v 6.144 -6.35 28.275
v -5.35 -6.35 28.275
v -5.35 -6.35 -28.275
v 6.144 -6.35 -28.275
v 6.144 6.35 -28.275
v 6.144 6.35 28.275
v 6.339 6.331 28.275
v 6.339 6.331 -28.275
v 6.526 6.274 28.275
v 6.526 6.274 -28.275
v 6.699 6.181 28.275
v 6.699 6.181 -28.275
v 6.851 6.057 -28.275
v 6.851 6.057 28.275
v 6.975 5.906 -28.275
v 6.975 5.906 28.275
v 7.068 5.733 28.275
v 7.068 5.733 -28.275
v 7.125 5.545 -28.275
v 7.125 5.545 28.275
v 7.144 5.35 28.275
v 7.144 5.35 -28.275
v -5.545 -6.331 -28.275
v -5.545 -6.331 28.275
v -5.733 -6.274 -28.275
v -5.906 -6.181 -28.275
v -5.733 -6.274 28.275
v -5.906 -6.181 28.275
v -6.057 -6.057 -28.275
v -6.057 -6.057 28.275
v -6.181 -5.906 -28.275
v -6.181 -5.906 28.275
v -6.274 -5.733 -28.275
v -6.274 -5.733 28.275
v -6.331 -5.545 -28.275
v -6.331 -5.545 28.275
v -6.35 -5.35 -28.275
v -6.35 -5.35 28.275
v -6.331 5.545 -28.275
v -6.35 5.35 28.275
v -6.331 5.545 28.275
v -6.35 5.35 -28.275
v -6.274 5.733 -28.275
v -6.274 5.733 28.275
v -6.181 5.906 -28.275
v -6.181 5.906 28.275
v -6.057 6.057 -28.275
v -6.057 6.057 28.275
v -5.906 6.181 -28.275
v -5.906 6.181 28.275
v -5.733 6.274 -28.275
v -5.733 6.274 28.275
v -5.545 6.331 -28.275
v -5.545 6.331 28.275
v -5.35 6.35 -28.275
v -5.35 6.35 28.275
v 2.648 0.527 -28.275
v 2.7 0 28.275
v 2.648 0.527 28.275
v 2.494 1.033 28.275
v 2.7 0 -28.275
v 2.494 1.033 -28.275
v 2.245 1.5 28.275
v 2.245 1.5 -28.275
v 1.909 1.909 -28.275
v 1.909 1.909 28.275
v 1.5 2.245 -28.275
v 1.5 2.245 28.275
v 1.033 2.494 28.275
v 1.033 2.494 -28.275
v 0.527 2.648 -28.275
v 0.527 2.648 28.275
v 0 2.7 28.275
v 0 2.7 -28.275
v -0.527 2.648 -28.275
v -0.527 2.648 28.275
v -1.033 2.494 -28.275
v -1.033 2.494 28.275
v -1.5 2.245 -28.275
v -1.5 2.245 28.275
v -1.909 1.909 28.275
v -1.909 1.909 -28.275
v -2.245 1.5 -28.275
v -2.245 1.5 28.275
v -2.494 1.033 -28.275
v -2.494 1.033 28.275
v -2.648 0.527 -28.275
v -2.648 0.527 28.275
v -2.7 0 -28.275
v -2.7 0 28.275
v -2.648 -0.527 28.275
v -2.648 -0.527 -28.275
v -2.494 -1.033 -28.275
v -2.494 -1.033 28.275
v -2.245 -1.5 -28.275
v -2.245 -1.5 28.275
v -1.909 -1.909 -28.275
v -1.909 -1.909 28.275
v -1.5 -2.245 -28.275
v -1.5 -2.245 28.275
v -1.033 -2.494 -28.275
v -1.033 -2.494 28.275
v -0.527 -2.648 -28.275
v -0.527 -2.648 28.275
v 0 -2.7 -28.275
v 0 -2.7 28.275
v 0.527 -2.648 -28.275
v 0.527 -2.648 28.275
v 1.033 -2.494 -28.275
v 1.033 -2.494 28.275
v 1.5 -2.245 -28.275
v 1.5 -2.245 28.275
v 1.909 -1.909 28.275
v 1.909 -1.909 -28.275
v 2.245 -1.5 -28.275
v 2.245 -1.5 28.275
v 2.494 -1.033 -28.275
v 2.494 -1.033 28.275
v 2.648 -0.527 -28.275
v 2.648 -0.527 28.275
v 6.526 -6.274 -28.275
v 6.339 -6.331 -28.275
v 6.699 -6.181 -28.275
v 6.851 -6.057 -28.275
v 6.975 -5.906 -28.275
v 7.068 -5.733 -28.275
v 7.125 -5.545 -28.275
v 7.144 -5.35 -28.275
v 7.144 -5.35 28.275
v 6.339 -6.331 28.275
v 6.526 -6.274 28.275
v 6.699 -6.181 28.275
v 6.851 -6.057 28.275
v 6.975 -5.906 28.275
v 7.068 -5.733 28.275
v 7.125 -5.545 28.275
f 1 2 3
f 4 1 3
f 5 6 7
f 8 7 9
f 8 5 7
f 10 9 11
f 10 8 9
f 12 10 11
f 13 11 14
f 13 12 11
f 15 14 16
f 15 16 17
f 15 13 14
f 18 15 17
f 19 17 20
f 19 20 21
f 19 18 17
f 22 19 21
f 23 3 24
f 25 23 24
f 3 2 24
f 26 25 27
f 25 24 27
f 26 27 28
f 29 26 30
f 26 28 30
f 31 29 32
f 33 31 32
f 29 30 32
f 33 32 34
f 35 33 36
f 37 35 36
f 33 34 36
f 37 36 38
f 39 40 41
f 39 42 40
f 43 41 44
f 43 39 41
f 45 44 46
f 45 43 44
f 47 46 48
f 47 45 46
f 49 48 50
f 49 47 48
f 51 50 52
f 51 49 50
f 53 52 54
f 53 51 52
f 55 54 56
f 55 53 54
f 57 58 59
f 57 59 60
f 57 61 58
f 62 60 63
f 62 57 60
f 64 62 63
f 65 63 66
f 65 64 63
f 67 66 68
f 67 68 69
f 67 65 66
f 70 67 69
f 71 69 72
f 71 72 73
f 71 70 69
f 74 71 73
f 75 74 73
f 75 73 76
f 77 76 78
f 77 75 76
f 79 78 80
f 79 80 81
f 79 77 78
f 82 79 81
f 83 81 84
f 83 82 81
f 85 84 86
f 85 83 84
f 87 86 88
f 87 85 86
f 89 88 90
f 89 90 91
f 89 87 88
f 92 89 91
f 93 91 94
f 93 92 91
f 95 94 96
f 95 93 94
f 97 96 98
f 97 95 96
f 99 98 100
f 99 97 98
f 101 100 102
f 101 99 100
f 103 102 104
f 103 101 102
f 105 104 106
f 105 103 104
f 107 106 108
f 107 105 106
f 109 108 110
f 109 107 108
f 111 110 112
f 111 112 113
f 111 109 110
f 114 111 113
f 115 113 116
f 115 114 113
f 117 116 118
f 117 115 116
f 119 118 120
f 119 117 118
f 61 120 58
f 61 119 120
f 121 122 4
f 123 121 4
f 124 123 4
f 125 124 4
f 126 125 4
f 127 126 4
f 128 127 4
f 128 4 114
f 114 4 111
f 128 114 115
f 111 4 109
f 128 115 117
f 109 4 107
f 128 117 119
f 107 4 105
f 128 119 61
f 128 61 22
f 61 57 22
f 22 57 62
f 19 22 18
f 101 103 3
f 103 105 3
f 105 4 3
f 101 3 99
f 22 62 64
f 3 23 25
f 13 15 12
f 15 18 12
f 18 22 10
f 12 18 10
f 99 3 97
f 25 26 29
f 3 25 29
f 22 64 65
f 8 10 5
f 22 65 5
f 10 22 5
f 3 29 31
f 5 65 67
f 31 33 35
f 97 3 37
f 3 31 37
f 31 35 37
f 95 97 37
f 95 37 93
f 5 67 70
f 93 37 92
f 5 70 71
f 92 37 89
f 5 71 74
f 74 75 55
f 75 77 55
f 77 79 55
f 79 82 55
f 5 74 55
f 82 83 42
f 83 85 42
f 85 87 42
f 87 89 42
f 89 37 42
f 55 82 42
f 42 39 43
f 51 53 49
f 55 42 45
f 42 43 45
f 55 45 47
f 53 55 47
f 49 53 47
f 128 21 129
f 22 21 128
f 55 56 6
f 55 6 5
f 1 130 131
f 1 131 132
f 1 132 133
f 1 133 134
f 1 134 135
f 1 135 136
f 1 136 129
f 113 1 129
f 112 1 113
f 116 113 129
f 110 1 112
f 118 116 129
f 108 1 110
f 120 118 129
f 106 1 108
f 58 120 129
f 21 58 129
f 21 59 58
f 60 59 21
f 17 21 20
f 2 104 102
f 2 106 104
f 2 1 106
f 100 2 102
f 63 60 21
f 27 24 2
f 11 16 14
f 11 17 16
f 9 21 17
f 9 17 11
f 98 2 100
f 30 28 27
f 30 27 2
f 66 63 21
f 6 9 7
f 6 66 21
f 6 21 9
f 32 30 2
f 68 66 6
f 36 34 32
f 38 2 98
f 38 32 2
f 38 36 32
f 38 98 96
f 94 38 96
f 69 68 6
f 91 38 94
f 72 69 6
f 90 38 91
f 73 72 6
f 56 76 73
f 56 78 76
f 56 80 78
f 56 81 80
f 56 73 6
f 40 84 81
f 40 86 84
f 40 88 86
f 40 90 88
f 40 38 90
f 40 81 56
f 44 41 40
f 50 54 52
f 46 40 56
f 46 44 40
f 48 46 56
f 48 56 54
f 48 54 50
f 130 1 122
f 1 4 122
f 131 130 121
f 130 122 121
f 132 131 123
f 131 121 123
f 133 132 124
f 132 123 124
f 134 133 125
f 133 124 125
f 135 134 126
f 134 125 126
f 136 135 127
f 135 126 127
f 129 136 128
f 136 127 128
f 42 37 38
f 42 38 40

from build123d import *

# Parameters (mm, degrees)
SKETCH1_W           = 12.7
SKETCH1_H           = 12.7
SKETCH1_R           = 2.7
BOSS_EXTRUDE1_DEPTH = 28.275
SKETCH4_W           = 56.55
SKETCH4_H           = 12.7
BOSS_EXTRUDE3_DEPTH = 0.79375
FILLET2_R           = 1


with BuildPart() as part:
    # Sketch1 → Boss-Extrude1 (new, symmetric)
    with BuildSketch(Plane.XY):
        Rectangle(SKETCH1_W, SKETCH1_H)
        Circle(SKETCH1_R, mode=Mode.SUBTRACT)
    extrude(amount=BOSS_EXTRUDE1_DEPTH, both=True)

    # Sketch4 → Boss-Extrude3 (add)
    with BuildSketch(Plane(origin=(6.35, 0, 0), x_dir=(0, 0, -1), z_dir=(1, 0, 0))):
        Rectangle(SKETCH4_W, SKETCH4_H)
    extrude(amount=BOSS_EXTRUDE3_DEPTH)

    # Fillet2
    fillet2_edges = [part.edges().sort_by_distance(p)[0] for p in [
        (7.14375, -6.35, 0),
        (7.14375, 6.35, 0),
        (-6.35, -6.35, 0),
        (-6.35, 6.35, 0),
    ]]
    fillet(fillet2_edges, radius=FILLET2_R)


solid = part.part
